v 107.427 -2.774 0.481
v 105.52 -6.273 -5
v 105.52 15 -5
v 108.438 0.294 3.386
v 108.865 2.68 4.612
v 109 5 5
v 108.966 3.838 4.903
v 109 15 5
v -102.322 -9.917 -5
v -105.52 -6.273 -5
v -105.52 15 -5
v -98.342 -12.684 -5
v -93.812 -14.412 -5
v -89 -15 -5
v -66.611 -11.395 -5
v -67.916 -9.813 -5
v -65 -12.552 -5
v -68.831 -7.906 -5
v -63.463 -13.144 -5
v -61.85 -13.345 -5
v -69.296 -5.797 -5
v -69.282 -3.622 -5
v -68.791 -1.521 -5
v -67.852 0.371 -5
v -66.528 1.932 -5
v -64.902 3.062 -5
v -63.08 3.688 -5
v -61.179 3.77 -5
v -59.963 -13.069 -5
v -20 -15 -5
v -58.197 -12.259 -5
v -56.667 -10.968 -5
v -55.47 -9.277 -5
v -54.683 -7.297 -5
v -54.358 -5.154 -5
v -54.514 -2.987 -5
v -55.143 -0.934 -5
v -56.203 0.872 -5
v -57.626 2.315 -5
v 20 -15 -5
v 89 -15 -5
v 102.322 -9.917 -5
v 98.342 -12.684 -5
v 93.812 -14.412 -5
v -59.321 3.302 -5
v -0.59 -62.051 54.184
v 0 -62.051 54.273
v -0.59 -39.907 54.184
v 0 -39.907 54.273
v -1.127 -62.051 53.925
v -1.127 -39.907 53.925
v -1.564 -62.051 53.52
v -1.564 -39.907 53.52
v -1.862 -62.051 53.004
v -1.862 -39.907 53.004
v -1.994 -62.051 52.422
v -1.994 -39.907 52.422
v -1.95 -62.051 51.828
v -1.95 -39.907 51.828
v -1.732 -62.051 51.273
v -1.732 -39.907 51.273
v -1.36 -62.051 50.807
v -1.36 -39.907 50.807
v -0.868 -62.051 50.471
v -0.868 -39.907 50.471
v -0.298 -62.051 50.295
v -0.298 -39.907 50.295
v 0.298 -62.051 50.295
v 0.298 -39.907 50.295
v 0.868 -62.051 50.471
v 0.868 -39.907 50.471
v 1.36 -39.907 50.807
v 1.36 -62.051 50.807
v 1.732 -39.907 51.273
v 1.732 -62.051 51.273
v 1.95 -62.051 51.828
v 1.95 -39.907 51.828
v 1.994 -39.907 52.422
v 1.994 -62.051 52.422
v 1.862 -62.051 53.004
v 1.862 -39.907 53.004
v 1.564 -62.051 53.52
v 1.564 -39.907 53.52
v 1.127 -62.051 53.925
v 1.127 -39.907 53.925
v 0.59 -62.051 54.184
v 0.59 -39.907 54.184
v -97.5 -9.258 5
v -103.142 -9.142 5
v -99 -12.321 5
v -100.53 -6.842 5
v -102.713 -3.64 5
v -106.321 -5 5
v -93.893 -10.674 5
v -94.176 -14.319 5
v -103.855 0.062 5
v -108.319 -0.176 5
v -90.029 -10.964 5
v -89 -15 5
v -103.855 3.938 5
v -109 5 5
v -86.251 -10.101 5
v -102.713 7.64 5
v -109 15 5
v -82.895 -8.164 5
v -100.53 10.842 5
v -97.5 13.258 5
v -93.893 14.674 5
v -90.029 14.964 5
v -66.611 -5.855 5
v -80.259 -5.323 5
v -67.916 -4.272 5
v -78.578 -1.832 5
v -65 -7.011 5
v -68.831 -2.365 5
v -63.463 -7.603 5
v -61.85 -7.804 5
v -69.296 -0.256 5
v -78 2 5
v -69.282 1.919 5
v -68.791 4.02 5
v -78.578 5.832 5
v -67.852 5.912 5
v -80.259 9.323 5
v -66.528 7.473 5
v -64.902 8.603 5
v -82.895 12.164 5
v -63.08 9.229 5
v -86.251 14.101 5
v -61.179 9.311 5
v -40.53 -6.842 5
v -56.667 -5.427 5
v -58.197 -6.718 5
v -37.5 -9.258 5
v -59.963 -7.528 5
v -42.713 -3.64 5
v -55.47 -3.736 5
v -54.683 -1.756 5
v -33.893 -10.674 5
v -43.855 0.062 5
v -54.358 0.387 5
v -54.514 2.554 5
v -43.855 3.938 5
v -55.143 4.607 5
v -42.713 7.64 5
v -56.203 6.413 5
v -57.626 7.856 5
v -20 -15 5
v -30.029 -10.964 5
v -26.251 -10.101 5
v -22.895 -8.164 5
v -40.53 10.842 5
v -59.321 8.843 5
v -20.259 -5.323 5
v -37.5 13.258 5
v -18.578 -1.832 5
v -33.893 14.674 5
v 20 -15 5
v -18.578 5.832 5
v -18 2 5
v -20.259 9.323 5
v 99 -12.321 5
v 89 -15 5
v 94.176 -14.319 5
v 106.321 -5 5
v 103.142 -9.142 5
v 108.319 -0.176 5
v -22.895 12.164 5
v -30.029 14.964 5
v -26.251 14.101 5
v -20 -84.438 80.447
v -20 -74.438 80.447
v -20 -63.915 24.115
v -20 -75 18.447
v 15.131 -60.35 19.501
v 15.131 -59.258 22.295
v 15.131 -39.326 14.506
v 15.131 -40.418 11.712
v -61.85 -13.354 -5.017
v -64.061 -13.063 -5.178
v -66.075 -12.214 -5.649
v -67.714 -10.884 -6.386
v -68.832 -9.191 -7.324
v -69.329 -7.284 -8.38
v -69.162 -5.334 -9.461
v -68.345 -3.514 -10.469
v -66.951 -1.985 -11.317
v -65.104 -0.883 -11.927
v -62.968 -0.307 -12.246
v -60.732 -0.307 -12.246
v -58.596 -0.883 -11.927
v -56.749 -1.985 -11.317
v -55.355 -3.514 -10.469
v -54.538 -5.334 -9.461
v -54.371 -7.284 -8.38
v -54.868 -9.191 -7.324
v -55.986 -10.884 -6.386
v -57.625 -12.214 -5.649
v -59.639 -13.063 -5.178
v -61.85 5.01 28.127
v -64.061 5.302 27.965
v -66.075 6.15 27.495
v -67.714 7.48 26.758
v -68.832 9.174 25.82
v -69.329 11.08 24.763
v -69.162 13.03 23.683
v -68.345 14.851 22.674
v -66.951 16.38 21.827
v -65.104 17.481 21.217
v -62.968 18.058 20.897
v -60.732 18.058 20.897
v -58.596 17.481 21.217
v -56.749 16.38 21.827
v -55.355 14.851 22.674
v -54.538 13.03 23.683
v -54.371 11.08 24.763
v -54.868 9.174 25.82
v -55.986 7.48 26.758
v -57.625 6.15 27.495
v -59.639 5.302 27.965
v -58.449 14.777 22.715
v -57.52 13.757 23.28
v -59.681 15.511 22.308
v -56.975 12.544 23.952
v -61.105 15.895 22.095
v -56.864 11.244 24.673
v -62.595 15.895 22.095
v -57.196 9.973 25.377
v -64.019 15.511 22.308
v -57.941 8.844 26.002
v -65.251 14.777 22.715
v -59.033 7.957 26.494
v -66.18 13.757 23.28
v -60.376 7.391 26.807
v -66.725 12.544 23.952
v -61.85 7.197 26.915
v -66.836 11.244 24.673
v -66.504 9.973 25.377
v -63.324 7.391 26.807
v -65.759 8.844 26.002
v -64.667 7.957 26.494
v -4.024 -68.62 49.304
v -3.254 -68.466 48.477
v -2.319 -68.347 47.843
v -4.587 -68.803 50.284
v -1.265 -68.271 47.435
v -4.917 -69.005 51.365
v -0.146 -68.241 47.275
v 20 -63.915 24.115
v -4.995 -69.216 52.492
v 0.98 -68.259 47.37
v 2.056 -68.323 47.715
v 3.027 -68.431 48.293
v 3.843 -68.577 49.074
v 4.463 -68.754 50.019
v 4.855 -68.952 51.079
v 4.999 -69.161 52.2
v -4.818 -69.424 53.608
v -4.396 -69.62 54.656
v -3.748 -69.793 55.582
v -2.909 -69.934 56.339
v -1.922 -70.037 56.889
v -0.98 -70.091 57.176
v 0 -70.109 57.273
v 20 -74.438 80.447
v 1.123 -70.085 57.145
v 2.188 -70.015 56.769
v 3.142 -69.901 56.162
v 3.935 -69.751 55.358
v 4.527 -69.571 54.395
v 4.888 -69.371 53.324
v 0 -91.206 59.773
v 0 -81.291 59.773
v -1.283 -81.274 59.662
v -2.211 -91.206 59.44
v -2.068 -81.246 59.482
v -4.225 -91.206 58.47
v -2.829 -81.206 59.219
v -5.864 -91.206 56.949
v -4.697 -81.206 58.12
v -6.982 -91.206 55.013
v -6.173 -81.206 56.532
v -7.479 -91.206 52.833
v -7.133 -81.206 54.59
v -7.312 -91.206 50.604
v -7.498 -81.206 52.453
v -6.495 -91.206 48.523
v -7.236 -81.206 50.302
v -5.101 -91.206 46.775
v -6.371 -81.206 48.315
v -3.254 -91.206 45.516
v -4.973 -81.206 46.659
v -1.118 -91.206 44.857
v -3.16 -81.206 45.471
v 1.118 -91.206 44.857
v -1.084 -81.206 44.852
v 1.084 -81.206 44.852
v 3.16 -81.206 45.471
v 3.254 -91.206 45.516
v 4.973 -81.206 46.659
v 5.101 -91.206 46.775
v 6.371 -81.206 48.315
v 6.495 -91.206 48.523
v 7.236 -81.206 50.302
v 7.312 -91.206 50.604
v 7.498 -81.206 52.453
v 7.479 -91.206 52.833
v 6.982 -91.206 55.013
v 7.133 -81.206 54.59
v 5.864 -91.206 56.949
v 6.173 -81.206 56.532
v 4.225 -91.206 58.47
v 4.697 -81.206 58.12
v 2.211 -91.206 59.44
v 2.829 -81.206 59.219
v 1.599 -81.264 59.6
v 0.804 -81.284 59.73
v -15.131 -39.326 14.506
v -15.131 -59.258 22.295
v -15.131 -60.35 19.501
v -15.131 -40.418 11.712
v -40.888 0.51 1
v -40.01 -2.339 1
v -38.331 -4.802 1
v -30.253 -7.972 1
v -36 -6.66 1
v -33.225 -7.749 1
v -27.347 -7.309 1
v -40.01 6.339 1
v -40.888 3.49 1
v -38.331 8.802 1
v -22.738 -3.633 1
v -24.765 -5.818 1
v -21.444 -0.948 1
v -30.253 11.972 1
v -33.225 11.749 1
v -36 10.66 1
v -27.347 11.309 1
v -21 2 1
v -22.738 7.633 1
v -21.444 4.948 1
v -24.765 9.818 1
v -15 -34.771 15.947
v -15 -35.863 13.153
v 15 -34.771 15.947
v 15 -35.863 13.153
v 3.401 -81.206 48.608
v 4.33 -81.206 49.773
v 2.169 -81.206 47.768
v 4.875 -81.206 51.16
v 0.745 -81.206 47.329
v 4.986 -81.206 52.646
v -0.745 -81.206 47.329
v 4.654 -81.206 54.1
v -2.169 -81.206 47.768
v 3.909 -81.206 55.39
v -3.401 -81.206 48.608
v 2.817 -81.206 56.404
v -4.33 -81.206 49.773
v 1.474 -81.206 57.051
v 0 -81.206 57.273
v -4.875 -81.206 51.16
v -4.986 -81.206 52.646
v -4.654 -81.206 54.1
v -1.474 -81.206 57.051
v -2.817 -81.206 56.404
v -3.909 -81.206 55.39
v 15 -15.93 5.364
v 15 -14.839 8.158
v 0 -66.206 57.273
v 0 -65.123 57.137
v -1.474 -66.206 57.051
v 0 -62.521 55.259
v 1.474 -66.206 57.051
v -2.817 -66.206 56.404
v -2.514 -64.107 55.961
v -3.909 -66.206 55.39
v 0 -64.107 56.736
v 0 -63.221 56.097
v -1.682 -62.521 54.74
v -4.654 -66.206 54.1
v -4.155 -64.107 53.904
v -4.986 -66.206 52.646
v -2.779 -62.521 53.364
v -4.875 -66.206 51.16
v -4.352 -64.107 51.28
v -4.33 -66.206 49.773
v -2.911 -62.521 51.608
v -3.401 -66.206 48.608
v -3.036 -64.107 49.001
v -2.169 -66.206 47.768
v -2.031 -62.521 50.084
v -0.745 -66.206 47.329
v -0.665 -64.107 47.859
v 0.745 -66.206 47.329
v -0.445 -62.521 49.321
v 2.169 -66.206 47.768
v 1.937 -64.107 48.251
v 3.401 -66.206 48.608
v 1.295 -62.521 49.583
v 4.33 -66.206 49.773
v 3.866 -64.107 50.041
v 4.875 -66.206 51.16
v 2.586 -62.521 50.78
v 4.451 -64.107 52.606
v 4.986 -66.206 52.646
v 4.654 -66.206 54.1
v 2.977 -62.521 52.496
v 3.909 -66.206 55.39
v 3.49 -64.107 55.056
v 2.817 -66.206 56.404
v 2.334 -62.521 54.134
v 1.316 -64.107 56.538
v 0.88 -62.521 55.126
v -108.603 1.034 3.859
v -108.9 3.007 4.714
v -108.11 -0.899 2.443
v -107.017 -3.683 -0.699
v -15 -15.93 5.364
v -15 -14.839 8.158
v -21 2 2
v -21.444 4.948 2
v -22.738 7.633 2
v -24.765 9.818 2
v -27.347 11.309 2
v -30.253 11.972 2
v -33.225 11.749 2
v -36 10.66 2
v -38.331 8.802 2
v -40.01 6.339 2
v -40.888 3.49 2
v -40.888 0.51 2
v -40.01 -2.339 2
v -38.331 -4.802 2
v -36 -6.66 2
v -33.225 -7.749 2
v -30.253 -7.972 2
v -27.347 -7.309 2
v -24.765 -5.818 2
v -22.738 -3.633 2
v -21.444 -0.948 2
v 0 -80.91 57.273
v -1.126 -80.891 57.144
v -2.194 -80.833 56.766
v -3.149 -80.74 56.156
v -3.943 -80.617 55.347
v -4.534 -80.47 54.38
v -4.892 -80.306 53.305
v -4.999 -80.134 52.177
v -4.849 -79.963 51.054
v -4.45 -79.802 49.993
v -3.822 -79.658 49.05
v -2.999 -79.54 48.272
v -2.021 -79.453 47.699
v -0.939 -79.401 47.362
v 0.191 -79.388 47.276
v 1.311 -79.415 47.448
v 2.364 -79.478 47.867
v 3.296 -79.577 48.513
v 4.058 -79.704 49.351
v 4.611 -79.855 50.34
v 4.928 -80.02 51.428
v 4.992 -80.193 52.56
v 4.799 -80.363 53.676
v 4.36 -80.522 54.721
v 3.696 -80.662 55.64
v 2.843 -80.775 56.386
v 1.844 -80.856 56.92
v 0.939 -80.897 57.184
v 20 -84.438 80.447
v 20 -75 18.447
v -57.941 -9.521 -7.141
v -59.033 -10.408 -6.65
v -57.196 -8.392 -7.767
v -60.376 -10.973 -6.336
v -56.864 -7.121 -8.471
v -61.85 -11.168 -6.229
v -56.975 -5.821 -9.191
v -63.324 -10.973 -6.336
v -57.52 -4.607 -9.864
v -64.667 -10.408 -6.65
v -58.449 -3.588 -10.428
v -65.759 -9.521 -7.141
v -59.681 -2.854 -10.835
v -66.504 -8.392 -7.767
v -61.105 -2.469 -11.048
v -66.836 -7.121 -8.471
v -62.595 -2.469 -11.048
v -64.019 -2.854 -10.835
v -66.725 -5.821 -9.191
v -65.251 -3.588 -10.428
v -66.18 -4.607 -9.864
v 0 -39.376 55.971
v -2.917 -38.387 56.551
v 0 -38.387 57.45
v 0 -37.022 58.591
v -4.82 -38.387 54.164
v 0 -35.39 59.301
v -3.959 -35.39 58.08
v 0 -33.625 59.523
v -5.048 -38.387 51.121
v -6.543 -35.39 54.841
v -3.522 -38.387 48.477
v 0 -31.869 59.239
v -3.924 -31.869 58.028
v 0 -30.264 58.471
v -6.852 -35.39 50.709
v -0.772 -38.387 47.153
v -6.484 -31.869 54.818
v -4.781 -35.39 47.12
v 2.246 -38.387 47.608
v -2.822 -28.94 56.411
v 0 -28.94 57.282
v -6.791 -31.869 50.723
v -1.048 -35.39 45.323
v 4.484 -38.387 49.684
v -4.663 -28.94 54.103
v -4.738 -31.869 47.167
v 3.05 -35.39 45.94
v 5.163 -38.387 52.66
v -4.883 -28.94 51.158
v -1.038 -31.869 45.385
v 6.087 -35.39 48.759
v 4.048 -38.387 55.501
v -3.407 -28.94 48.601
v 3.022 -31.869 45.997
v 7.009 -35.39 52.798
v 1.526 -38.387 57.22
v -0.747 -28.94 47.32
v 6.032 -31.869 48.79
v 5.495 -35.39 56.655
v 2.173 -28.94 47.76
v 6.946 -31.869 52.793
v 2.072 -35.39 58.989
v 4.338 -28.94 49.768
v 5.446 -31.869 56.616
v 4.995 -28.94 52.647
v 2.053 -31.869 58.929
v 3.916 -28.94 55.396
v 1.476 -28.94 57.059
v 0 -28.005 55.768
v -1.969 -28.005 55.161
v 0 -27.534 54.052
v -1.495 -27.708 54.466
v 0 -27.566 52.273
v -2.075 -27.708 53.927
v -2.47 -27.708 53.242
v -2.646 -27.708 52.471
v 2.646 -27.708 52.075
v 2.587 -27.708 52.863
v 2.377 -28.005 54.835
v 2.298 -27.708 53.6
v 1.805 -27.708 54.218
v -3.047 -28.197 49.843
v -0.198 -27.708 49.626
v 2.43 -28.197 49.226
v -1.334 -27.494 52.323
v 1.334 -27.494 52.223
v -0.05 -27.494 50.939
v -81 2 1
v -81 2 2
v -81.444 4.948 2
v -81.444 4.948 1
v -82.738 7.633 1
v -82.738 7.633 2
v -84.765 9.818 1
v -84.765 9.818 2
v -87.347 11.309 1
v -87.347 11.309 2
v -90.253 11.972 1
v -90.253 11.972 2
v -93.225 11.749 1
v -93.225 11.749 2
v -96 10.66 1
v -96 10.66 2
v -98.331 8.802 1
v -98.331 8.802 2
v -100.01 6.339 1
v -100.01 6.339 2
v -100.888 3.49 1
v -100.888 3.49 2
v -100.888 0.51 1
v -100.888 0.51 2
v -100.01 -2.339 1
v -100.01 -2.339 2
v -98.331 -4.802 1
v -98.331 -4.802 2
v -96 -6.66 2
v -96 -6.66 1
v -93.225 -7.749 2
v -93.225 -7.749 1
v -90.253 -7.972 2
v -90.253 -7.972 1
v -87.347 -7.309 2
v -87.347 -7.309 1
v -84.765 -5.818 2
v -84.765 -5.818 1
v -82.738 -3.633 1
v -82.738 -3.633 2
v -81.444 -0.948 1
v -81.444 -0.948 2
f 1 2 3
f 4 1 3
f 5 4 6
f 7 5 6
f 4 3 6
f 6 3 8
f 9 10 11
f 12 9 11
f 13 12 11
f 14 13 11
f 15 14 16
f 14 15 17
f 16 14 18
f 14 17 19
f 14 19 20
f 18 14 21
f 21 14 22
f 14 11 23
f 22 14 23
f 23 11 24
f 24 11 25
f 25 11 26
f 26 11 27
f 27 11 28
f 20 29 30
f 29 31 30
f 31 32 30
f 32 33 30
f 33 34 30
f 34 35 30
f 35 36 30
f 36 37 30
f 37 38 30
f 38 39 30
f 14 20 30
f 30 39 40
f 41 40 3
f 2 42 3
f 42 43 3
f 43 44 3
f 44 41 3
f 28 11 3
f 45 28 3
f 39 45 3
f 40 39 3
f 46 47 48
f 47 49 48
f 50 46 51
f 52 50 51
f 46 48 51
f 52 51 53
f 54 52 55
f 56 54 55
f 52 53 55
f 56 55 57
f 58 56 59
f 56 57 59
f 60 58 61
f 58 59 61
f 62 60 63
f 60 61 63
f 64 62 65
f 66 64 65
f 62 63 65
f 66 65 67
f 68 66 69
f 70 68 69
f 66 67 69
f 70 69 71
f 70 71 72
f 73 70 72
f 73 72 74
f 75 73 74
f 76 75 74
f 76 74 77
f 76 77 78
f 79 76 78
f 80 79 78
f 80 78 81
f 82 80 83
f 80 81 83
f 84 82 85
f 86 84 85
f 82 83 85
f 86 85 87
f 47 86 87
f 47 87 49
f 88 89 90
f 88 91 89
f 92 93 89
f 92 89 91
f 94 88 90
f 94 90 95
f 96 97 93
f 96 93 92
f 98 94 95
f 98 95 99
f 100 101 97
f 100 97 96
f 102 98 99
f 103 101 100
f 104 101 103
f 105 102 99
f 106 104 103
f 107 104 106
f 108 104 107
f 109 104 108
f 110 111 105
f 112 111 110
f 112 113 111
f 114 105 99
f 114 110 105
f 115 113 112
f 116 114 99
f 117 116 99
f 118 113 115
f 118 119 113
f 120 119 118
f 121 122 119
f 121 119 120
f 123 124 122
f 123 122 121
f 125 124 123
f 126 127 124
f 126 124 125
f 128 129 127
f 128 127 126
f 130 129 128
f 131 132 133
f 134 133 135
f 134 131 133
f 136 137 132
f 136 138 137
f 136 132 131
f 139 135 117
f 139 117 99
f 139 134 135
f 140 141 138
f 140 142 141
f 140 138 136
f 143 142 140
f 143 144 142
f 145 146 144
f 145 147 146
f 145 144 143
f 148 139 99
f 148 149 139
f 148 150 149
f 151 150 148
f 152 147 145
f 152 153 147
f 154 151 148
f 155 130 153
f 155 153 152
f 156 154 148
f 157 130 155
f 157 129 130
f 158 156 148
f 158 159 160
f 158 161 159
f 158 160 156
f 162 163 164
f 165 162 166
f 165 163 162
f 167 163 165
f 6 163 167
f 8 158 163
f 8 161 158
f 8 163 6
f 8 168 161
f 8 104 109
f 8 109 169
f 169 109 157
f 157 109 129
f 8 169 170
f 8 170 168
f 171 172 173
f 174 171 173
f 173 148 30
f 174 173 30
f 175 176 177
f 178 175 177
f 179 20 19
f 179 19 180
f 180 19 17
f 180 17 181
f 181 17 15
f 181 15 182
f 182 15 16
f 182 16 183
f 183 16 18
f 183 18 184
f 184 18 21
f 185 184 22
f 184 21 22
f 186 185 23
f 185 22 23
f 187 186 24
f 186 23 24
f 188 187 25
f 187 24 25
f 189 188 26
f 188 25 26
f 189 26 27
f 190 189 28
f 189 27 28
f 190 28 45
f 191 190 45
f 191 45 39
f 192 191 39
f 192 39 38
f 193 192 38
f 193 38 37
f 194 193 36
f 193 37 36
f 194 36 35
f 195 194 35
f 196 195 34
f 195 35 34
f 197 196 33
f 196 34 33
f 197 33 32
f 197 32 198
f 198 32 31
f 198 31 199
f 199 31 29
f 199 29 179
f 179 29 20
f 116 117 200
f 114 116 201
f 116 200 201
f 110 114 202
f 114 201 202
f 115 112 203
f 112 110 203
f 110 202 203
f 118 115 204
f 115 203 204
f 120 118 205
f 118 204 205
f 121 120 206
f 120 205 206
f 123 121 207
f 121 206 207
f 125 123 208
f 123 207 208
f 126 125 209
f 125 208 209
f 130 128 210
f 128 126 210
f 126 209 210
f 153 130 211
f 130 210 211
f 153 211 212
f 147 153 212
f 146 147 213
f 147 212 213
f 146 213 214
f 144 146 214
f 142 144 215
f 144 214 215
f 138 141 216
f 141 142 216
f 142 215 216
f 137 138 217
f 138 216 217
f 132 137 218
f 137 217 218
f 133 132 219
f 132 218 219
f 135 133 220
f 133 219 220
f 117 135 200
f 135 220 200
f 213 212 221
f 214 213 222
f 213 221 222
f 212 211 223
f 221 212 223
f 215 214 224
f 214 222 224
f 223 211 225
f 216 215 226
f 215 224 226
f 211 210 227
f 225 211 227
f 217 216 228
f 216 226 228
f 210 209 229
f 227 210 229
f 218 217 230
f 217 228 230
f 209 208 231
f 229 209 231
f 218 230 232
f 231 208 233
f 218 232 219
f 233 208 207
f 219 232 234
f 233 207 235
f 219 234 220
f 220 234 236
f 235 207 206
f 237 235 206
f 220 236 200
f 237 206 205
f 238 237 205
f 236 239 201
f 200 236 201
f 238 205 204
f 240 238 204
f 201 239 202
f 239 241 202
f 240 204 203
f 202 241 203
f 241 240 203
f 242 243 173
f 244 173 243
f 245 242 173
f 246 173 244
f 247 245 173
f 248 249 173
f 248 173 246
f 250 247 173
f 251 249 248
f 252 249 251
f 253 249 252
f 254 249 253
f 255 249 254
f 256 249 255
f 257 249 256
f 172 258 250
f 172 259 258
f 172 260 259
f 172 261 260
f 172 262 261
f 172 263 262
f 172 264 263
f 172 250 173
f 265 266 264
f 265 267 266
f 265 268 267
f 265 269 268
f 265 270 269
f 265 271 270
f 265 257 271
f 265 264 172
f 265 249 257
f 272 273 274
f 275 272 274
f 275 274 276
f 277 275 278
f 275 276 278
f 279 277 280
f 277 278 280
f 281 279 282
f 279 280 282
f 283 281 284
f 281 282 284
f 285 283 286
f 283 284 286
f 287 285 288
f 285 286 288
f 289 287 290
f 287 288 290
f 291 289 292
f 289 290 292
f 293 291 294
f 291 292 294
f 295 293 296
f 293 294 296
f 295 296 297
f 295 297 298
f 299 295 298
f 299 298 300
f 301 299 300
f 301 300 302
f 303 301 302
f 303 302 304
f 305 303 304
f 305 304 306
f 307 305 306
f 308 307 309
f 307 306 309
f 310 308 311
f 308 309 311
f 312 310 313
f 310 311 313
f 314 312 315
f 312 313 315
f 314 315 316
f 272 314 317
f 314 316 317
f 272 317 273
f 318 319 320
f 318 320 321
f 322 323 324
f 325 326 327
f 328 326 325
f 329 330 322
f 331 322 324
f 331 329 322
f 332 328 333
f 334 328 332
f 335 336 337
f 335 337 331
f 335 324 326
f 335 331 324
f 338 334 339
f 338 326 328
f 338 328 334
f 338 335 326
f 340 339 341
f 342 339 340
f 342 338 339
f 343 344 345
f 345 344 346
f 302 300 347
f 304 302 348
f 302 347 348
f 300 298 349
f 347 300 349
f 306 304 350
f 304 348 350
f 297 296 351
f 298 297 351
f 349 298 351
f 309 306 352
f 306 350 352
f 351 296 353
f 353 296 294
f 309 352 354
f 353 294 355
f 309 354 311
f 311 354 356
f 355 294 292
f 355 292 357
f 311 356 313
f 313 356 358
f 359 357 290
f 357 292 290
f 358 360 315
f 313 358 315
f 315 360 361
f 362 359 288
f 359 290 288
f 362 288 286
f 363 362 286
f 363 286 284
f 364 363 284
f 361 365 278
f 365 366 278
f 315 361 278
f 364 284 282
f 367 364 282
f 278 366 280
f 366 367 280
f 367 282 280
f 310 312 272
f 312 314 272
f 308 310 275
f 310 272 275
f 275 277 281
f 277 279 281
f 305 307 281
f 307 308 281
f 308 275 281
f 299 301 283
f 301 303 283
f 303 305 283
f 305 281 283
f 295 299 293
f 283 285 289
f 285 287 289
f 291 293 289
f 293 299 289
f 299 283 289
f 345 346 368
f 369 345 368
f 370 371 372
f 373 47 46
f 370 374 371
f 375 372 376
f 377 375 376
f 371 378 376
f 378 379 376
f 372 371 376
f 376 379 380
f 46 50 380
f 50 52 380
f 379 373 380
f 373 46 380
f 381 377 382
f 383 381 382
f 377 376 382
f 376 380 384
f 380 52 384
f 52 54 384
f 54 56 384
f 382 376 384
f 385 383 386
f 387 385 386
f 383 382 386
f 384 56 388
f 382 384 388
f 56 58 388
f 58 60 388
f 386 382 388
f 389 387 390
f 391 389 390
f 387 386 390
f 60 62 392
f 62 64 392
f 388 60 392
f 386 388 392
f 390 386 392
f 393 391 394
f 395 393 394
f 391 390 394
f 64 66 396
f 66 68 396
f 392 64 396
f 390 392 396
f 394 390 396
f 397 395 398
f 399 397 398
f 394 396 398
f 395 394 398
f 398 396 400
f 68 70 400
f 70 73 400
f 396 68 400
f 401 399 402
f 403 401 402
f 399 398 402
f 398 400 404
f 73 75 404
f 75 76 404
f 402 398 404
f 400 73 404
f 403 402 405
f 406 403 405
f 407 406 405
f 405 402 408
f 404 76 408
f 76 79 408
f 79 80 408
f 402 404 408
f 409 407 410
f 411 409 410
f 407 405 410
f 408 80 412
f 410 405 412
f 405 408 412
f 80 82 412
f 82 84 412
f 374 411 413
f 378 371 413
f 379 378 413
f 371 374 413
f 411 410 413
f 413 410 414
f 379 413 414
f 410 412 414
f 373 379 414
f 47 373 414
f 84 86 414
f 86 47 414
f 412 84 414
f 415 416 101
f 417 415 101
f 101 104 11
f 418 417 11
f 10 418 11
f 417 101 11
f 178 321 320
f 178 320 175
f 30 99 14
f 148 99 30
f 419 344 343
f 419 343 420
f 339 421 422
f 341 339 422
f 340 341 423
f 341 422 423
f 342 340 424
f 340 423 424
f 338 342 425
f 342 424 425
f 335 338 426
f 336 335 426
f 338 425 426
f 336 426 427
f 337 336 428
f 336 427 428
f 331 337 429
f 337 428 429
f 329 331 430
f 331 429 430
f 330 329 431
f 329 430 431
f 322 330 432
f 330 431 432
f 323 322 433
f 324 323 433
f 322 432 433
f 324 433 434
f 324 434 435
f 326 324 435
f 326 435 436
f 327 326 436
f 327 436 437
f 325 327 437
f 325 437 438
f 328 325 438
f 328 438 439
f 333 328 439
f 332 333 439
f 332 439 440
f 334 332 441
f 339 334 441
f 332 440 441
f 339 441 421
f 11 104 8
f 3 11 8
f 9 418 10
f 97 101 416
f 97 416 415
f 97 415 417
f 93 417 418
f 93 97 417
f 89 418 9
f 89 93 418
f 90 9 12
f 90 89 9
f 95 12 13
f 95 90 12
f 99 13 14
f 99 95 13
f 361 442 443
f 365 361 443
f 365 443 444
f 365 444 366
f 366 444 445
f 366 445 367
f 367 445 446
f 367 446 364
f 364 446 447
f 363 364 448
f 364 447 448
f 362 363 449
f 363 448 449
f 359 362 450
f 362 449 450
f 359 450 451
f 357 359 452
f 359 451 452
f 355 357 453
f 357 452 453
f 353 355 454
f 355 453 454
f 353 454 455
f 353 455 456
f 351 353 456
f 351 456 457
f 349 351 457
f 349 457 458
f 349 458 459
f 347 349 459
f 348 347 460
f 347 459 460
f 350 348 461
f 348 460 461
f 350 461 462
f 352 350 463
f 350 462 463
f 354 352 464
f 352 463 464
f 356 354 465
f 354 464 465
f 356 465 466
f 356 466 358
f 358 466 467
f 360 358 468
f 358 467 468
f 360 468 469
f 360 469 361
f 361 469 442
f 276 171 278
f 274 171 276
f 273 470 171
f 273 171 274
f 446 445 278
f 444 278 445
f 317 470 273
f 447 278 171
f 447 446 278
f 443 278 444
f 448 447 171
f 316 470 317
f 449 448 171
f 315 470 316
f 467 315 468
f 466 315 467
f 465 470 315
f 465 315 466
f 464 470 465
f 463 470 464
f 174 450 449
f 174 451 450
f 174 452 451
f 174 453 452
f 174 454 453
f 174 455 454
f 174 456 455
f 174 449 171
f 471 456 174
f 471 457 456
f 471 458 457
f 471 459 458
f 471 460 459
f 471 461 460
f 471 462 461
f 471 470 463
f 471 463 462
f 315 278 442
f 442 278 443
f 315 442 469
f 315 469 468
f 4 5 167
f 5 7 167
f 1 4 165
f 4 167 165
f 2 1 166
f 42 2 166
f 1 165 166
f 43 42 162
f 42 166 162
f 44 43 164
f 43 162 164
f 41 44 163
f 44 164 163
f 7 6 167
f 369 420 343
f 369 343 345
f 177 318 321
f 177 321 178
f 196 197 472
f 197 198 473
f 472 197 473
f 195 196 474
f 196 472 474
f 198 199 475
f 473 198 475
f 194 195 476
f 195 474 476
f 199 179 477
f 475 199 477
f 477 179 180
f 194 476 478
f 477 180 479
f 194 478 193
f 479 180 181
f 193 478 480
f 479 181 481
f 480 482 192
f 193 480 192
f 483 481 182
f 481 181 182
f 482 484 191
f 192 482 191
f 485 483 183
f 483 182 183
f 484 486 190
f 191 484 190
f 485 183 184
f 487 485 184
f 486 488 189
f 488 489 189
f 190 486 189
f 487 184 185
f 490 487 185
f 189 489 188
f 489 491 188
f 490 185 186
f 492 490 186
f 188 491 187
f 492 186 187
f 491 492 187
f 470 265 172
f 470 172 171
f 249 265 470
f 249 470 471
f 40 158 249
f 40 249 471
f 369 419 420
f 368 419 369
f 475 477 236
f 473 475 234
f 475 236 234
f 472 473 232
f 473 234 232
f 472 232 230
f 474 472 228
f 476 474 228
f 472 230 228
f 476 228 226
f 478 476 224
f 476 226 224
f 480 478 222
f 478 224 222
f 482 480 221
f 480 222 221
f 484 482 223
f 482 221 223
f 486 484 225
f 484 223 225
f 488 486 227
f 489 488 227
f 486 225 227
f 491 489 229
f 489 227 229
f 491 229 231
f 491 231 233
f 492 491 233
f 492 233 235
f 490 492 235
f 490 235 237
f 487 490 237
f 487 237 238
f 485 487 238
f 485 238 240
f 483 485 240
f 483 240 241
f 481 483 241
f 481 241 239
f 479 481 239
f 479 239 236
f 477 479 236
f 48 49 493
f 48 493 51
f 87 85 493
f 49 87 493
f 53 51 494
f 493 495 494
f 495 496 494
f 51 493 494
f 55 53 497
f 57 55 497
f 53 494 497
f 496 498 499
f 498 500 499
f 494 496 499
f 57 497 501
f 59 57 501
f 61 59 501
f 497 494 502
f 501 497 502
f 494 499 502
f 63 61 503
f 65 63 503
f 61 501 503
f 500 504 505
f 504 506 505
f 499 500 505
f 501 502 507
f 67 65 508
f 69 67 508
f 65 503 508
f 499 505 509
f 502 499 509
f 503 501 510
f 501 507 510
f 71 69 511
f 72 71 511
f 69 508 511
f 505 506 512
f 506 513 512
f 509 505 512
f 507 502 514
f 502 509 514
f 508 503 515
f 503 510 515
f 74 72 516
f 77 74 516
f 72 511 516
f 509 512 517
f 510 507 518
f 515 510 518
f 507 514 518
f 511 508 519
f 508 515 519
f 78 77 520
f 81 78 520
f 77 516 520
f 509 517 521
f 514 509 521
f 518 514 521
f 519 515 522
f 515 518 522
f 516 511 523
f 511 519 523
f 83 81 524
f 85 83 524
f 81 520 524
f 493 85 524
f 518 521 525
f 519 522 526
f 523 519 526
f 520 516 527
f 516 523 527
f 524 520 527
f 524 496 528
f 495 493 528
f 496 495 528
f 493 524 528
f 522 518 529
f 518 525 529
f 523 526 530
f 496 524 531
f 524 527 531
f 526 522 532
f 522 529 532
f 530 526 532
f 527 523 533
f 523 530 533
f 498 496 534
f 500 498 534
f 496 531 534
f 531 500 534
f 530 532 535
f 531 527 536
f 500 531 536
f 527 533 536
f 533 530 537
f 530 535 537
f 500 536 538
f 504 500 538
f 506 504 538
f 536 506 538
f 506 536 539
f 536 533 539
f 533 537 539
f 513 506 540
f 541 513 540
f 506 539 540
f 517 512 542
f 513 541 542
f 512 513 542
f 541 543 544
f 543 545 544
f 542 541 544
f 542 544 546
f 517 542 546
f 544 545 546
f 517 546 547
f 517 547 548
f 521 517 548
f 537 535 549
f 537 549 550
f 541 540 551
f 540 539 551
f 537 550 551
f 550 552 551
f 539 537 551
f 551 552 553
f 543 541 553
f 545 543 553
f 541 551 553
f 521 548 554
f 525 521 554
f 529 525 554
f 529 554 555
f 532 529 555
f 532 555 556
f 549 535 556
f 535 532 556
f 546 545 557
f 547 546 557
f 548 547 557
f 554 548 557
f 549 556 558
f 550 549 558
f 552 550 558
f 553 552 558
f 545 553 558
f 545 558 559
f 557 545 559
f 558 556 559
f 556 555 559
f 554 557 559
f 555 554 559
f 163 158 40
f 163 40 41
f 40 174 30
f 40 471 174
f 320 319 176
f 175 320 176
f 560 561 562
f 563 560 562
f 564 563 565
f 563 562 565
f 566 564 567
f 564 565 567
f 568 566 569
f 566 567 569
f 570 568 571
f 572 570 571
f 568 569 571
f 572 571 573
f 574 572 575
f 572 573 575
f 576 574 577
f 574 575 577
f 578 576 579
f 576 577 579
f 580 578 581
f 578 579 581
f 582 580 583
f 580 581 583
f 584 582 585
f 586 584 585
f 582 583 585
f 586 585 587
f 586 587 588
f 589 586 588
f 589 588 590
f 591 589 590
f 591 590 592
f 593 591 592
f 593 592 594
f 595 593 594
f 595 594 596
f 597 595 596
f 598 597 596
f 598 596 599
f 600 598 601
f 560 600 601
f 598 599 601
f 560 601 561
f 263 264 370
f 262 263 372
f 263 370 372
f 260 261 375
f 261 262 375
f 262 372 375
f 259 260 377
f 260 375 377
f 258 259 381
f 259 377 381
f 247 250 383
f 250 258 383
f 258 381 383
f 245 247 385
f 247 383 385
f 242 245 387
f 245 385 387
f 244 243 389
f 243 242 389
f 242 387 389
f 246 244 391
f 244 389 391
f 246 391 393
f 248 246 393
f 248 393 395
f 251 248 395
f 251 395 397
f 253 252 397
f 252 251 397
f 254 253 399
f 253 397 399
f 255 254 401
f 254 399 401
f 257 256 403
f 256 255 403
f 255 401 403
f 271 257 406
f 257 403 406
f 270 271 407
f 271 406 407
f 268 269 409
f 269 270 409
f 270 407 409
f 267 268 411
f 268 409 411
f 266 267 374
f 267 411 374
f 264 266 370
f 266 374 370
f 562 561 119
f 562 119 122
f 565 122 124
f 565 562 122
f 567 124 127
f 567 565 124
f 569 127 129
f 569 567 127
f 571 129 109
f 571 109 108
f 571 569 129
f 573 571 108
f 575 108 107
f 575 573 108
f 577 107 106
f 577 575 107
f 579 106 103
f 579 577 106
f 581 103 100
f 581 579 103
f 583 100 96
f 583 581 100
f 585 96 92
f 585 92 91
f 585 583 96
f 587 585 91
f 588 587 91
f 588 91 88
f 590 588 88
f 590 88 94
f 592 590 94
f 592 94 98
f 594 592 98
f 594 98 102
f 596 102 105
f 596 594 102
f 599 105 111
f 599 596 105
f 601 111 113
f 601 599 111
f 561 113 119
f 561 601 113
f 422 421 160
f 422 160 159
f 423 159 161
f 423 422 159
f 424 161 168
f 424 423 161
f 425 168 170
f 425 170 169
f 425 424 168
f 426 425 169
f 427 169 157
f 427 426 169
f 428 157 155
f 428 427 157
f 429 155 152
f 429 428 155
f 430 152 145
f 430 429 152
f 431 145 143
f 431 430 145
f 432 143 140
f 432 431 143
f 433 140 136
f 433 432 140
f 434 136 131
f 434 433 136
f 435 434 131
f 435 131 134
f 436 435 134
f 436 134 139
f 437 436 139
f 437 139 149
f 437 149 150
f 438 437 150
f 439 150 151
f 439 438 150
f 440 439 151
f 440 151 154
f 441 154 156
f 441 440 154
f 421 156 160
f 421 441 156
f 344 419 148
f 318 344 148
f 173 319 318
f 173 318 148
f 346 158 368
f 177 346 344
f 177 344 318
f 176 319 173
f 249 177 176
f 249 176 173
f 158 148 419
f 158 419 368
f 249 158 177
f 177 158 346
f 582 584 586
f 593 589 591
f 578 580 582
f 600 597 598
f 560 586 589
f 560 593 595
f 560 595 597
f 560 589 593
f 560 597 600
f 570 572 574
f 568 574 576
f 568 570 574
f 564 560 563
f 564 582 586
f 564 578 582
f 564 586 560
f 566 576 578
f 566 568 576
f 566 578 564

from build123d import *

# Parameters (mm, degrees)
SKETCH1_W           = 218
SKETCH1_H           = 30
BOSS_EXTRUDE1_DEPTH = 5
FILLET1_R           = 20
SKETCH2_R           = 10
CUT_EXTRUDE2_DEPTH  = 4
CHAMFER1_SIZE       = 3
SKETCH4_R           = 5
CUT_EXTRUDE3_DEPTH  = 119.159523594
BOSS_EXTRUDE4_DEPTH = 20
SKETCH7_W           = 30
SKETCH7_H           = 21.4
BOSS_EXTRUDE6_DEPTH = 3
SKETCH12_W          = 30.262484152
SKETCH12_H          = 21.4
CUT_EXTRUDE6_DEPTH  = 3
CUT_EXTRUDE7_DEPTH  = 40
CUT_EXTRUDE9_DEPTH  = 40


with BuildPart() as part:
    # Sketch1 → Boss-Extrude1 (new, symmetric)
    with BuildSketch(Plane.XY):
        Rectangle(SKETCH1_W, SKETCH1_H)
    extrude(amount=BOSS_EXTRUDE1_DEPTH, both=True)

    # Fillet1
    fillet1_edges = [part.edges().sort_by_distance(p)[0] for p in [
        (109, -15, 0),
        (-109, -15, 0),
    ]]
    fillet(fillet1_edges, radius=FILLET1_R)

    # Sketch2 → Cut-Extrude2 (cut)
    with BuildSketch(Plane.XY.offset(5)):
        with Locations((-91, 2)):
            Circle(SKETCH2_R)
        with Locations((-31, 2)):
            Circle(SKETCH2_R)
    extrude(amount=-CUT_EXTRUDE2_DEPTH, mode=Mode.SUBTRACT)

    # Chamfer1
    chamfer1_edges = [part.edges().sort_by_distance(p)[0] for p in [
        (-101, 2, 5),
        (-41, 2, 5),
    ]]
    chamfer(chamfer1_edges, length=CHAMFER1_SIZE - 0.0001)  # a hair under: the kernel refuses the full size

    # Sketch3 → Revolve1 (revolve)
    with BuildSketch(Plane(origin=(-61.85, 0, 0), x_dir=(0, 0, -1), z_dir=(1, 0, 0)), mode=Mode.PRIVATE) as revolve1_sk:
        Polygon((-20.856554777, 18.13092454), (-24.491559772, 11.570685315), (8.651987636, -6.794035278), (12.286992632, -0.233796053), align=None)
    revolve(revolve1_sk.sketch.rotate(Axis((-61.85, 11.570685315, 24.491559772), (0, -0.48466733269062345, -0.8746985632905524)), 180), axis=Axis((-61.85, 11.570685315, 24.491559772), (0, -0.48466733269062345, -0.8746985632905524)))

    # Sketch4 → Cut-Extrude3 (cut, through all)
    with BuildSketch(Plane(origin=(0, 13.100880469, 23.643684133), x_dir=(1, 0, 0), z_dir=(0, 0.48466733269062356, 0.8746985632905525))):
        with Locations(Location((-61.85, -1.749397127, 0), (0, 0, 270))):
            Circle(SKETCH4_R)
    extrude(amount=-CUT_EXTRUDE3_DEPTH, mode=Mode.SUBTRACT)

    # Sketch5 → Boss-Extrude4 (add, symmetric)
    with BuildSketch(Plane(origin=(0, 0, 0), x_dir=(0, 0, -1), z_dir=(1, 0, 0))):
        Polygon((5, -15), (-5, -15), (-24.115322554, -63.915136607), (-80.44712563, -74.437688296), (-80.44712563, -84.437688296), (-18.44712563, -75), align=None)
    extrude(amount=BOSS_EXTRUDE4_DEPTH, both=True)

    # Sketch7 → Boss-Extrude6 (add)
    with BuildSketch(Plane(origin=(0, -0.292155586, -0.747611262), x_dir=(1, 0, 0), z_dir=(0, 0.3639801648731982, 0.9314066993418502))):
        with Locations((0, -27.490001314)):
            Rectangle(SKETCH7_W, SKETCH7_H)
    extrude(amount=BOSS_EXTRUDE6_DEPTH)

    # Sketch12 → Cut-Extrude6 (cut)
    with BuildSketch(Plane(origin=(0, -0.292155586, -0.747611262), x_dir=(1, 0, 0), z_dir=(0, 0.3639801648731982, 0.9314066993418502))):
        with Locations((0, -52.608485504)):
            Rectangle(SKETCH12_W, SKETCH12_H)
    extrude(amount=-CUT_EXTRUDE6_DEPTH, mode=Mode.SUBTRACT)

    # Sketch16 → Revolve2 (revolve)
    with BuildSketch(Plane(origin=(0, 0, 0), x_dir=(0, 0, -1), z_dir=(1, 0, 0)), mode=Mode.PRIVATE) as revolve2_sk:
        with BuildLine():
            Line((-52.272833575, -27.565753671), (-52.272833575, -91.206271932))
            Line((-52.272833575, -91.206271932), (-44.772833575, -91.206271932))
            Line((-44.772833575, -91.206271932), (-44.772833575, -81.206271932))
            Line((-44.772833575, -81.206271932), (-47.272833575, -81.206271932))
            Line((-47.272833575, -81.206271932), (-47.272833575, -66.206271932))
            ThreePointArc((-47.272833575, -66.206271932), (-48.101213981, -63.643814293), (-50.272833575, -62.051183895))
            Line((-50.272833575, -62.051183895), (-50.272833575, -39.90745984))
            ThreePointArc((-50.272833575, -39.90745984), (-45.10198049, -32.736606756), (-52.272833575, -27.565753671))
        make_face()
    revolve(revolve2_sk.sketch.rotate(Axis((0, -19.401017973, 52.272833575), (0, -1, 0)), 180), axis=Axis((0, -19.401017973, 52.272833575), (0, -1, 0)))

    # Sketch17 → Cut-Extrude7 (cut)
    with BuildSketch(Plane(origin=(0, 15, 0), x_dir=(1, 0, 0), z_dir=(0, 1, 0))):
        Polygon((-109, 5), (-109, -5), (-105.52, 5), align=None)
    extrude(amount=-CUT_EXTRUDE7_DEPTH, mode=Mode.SUBTRACT)

    # Sketch19 → Cut-Extrude9 (cut)
    with BuildSketch(Plane(origin=(0, 15, 0), x_dir=(1, 0, 0), z_dir=(0, 1, 0))):
        Polygon((109, 5), (105.52, 5), (109, -5), align=None)
    extrude(amount=-CUT_EXTRUDE9_DEPTH, mode=Mode.SUBTRACT)


solid = part.part
